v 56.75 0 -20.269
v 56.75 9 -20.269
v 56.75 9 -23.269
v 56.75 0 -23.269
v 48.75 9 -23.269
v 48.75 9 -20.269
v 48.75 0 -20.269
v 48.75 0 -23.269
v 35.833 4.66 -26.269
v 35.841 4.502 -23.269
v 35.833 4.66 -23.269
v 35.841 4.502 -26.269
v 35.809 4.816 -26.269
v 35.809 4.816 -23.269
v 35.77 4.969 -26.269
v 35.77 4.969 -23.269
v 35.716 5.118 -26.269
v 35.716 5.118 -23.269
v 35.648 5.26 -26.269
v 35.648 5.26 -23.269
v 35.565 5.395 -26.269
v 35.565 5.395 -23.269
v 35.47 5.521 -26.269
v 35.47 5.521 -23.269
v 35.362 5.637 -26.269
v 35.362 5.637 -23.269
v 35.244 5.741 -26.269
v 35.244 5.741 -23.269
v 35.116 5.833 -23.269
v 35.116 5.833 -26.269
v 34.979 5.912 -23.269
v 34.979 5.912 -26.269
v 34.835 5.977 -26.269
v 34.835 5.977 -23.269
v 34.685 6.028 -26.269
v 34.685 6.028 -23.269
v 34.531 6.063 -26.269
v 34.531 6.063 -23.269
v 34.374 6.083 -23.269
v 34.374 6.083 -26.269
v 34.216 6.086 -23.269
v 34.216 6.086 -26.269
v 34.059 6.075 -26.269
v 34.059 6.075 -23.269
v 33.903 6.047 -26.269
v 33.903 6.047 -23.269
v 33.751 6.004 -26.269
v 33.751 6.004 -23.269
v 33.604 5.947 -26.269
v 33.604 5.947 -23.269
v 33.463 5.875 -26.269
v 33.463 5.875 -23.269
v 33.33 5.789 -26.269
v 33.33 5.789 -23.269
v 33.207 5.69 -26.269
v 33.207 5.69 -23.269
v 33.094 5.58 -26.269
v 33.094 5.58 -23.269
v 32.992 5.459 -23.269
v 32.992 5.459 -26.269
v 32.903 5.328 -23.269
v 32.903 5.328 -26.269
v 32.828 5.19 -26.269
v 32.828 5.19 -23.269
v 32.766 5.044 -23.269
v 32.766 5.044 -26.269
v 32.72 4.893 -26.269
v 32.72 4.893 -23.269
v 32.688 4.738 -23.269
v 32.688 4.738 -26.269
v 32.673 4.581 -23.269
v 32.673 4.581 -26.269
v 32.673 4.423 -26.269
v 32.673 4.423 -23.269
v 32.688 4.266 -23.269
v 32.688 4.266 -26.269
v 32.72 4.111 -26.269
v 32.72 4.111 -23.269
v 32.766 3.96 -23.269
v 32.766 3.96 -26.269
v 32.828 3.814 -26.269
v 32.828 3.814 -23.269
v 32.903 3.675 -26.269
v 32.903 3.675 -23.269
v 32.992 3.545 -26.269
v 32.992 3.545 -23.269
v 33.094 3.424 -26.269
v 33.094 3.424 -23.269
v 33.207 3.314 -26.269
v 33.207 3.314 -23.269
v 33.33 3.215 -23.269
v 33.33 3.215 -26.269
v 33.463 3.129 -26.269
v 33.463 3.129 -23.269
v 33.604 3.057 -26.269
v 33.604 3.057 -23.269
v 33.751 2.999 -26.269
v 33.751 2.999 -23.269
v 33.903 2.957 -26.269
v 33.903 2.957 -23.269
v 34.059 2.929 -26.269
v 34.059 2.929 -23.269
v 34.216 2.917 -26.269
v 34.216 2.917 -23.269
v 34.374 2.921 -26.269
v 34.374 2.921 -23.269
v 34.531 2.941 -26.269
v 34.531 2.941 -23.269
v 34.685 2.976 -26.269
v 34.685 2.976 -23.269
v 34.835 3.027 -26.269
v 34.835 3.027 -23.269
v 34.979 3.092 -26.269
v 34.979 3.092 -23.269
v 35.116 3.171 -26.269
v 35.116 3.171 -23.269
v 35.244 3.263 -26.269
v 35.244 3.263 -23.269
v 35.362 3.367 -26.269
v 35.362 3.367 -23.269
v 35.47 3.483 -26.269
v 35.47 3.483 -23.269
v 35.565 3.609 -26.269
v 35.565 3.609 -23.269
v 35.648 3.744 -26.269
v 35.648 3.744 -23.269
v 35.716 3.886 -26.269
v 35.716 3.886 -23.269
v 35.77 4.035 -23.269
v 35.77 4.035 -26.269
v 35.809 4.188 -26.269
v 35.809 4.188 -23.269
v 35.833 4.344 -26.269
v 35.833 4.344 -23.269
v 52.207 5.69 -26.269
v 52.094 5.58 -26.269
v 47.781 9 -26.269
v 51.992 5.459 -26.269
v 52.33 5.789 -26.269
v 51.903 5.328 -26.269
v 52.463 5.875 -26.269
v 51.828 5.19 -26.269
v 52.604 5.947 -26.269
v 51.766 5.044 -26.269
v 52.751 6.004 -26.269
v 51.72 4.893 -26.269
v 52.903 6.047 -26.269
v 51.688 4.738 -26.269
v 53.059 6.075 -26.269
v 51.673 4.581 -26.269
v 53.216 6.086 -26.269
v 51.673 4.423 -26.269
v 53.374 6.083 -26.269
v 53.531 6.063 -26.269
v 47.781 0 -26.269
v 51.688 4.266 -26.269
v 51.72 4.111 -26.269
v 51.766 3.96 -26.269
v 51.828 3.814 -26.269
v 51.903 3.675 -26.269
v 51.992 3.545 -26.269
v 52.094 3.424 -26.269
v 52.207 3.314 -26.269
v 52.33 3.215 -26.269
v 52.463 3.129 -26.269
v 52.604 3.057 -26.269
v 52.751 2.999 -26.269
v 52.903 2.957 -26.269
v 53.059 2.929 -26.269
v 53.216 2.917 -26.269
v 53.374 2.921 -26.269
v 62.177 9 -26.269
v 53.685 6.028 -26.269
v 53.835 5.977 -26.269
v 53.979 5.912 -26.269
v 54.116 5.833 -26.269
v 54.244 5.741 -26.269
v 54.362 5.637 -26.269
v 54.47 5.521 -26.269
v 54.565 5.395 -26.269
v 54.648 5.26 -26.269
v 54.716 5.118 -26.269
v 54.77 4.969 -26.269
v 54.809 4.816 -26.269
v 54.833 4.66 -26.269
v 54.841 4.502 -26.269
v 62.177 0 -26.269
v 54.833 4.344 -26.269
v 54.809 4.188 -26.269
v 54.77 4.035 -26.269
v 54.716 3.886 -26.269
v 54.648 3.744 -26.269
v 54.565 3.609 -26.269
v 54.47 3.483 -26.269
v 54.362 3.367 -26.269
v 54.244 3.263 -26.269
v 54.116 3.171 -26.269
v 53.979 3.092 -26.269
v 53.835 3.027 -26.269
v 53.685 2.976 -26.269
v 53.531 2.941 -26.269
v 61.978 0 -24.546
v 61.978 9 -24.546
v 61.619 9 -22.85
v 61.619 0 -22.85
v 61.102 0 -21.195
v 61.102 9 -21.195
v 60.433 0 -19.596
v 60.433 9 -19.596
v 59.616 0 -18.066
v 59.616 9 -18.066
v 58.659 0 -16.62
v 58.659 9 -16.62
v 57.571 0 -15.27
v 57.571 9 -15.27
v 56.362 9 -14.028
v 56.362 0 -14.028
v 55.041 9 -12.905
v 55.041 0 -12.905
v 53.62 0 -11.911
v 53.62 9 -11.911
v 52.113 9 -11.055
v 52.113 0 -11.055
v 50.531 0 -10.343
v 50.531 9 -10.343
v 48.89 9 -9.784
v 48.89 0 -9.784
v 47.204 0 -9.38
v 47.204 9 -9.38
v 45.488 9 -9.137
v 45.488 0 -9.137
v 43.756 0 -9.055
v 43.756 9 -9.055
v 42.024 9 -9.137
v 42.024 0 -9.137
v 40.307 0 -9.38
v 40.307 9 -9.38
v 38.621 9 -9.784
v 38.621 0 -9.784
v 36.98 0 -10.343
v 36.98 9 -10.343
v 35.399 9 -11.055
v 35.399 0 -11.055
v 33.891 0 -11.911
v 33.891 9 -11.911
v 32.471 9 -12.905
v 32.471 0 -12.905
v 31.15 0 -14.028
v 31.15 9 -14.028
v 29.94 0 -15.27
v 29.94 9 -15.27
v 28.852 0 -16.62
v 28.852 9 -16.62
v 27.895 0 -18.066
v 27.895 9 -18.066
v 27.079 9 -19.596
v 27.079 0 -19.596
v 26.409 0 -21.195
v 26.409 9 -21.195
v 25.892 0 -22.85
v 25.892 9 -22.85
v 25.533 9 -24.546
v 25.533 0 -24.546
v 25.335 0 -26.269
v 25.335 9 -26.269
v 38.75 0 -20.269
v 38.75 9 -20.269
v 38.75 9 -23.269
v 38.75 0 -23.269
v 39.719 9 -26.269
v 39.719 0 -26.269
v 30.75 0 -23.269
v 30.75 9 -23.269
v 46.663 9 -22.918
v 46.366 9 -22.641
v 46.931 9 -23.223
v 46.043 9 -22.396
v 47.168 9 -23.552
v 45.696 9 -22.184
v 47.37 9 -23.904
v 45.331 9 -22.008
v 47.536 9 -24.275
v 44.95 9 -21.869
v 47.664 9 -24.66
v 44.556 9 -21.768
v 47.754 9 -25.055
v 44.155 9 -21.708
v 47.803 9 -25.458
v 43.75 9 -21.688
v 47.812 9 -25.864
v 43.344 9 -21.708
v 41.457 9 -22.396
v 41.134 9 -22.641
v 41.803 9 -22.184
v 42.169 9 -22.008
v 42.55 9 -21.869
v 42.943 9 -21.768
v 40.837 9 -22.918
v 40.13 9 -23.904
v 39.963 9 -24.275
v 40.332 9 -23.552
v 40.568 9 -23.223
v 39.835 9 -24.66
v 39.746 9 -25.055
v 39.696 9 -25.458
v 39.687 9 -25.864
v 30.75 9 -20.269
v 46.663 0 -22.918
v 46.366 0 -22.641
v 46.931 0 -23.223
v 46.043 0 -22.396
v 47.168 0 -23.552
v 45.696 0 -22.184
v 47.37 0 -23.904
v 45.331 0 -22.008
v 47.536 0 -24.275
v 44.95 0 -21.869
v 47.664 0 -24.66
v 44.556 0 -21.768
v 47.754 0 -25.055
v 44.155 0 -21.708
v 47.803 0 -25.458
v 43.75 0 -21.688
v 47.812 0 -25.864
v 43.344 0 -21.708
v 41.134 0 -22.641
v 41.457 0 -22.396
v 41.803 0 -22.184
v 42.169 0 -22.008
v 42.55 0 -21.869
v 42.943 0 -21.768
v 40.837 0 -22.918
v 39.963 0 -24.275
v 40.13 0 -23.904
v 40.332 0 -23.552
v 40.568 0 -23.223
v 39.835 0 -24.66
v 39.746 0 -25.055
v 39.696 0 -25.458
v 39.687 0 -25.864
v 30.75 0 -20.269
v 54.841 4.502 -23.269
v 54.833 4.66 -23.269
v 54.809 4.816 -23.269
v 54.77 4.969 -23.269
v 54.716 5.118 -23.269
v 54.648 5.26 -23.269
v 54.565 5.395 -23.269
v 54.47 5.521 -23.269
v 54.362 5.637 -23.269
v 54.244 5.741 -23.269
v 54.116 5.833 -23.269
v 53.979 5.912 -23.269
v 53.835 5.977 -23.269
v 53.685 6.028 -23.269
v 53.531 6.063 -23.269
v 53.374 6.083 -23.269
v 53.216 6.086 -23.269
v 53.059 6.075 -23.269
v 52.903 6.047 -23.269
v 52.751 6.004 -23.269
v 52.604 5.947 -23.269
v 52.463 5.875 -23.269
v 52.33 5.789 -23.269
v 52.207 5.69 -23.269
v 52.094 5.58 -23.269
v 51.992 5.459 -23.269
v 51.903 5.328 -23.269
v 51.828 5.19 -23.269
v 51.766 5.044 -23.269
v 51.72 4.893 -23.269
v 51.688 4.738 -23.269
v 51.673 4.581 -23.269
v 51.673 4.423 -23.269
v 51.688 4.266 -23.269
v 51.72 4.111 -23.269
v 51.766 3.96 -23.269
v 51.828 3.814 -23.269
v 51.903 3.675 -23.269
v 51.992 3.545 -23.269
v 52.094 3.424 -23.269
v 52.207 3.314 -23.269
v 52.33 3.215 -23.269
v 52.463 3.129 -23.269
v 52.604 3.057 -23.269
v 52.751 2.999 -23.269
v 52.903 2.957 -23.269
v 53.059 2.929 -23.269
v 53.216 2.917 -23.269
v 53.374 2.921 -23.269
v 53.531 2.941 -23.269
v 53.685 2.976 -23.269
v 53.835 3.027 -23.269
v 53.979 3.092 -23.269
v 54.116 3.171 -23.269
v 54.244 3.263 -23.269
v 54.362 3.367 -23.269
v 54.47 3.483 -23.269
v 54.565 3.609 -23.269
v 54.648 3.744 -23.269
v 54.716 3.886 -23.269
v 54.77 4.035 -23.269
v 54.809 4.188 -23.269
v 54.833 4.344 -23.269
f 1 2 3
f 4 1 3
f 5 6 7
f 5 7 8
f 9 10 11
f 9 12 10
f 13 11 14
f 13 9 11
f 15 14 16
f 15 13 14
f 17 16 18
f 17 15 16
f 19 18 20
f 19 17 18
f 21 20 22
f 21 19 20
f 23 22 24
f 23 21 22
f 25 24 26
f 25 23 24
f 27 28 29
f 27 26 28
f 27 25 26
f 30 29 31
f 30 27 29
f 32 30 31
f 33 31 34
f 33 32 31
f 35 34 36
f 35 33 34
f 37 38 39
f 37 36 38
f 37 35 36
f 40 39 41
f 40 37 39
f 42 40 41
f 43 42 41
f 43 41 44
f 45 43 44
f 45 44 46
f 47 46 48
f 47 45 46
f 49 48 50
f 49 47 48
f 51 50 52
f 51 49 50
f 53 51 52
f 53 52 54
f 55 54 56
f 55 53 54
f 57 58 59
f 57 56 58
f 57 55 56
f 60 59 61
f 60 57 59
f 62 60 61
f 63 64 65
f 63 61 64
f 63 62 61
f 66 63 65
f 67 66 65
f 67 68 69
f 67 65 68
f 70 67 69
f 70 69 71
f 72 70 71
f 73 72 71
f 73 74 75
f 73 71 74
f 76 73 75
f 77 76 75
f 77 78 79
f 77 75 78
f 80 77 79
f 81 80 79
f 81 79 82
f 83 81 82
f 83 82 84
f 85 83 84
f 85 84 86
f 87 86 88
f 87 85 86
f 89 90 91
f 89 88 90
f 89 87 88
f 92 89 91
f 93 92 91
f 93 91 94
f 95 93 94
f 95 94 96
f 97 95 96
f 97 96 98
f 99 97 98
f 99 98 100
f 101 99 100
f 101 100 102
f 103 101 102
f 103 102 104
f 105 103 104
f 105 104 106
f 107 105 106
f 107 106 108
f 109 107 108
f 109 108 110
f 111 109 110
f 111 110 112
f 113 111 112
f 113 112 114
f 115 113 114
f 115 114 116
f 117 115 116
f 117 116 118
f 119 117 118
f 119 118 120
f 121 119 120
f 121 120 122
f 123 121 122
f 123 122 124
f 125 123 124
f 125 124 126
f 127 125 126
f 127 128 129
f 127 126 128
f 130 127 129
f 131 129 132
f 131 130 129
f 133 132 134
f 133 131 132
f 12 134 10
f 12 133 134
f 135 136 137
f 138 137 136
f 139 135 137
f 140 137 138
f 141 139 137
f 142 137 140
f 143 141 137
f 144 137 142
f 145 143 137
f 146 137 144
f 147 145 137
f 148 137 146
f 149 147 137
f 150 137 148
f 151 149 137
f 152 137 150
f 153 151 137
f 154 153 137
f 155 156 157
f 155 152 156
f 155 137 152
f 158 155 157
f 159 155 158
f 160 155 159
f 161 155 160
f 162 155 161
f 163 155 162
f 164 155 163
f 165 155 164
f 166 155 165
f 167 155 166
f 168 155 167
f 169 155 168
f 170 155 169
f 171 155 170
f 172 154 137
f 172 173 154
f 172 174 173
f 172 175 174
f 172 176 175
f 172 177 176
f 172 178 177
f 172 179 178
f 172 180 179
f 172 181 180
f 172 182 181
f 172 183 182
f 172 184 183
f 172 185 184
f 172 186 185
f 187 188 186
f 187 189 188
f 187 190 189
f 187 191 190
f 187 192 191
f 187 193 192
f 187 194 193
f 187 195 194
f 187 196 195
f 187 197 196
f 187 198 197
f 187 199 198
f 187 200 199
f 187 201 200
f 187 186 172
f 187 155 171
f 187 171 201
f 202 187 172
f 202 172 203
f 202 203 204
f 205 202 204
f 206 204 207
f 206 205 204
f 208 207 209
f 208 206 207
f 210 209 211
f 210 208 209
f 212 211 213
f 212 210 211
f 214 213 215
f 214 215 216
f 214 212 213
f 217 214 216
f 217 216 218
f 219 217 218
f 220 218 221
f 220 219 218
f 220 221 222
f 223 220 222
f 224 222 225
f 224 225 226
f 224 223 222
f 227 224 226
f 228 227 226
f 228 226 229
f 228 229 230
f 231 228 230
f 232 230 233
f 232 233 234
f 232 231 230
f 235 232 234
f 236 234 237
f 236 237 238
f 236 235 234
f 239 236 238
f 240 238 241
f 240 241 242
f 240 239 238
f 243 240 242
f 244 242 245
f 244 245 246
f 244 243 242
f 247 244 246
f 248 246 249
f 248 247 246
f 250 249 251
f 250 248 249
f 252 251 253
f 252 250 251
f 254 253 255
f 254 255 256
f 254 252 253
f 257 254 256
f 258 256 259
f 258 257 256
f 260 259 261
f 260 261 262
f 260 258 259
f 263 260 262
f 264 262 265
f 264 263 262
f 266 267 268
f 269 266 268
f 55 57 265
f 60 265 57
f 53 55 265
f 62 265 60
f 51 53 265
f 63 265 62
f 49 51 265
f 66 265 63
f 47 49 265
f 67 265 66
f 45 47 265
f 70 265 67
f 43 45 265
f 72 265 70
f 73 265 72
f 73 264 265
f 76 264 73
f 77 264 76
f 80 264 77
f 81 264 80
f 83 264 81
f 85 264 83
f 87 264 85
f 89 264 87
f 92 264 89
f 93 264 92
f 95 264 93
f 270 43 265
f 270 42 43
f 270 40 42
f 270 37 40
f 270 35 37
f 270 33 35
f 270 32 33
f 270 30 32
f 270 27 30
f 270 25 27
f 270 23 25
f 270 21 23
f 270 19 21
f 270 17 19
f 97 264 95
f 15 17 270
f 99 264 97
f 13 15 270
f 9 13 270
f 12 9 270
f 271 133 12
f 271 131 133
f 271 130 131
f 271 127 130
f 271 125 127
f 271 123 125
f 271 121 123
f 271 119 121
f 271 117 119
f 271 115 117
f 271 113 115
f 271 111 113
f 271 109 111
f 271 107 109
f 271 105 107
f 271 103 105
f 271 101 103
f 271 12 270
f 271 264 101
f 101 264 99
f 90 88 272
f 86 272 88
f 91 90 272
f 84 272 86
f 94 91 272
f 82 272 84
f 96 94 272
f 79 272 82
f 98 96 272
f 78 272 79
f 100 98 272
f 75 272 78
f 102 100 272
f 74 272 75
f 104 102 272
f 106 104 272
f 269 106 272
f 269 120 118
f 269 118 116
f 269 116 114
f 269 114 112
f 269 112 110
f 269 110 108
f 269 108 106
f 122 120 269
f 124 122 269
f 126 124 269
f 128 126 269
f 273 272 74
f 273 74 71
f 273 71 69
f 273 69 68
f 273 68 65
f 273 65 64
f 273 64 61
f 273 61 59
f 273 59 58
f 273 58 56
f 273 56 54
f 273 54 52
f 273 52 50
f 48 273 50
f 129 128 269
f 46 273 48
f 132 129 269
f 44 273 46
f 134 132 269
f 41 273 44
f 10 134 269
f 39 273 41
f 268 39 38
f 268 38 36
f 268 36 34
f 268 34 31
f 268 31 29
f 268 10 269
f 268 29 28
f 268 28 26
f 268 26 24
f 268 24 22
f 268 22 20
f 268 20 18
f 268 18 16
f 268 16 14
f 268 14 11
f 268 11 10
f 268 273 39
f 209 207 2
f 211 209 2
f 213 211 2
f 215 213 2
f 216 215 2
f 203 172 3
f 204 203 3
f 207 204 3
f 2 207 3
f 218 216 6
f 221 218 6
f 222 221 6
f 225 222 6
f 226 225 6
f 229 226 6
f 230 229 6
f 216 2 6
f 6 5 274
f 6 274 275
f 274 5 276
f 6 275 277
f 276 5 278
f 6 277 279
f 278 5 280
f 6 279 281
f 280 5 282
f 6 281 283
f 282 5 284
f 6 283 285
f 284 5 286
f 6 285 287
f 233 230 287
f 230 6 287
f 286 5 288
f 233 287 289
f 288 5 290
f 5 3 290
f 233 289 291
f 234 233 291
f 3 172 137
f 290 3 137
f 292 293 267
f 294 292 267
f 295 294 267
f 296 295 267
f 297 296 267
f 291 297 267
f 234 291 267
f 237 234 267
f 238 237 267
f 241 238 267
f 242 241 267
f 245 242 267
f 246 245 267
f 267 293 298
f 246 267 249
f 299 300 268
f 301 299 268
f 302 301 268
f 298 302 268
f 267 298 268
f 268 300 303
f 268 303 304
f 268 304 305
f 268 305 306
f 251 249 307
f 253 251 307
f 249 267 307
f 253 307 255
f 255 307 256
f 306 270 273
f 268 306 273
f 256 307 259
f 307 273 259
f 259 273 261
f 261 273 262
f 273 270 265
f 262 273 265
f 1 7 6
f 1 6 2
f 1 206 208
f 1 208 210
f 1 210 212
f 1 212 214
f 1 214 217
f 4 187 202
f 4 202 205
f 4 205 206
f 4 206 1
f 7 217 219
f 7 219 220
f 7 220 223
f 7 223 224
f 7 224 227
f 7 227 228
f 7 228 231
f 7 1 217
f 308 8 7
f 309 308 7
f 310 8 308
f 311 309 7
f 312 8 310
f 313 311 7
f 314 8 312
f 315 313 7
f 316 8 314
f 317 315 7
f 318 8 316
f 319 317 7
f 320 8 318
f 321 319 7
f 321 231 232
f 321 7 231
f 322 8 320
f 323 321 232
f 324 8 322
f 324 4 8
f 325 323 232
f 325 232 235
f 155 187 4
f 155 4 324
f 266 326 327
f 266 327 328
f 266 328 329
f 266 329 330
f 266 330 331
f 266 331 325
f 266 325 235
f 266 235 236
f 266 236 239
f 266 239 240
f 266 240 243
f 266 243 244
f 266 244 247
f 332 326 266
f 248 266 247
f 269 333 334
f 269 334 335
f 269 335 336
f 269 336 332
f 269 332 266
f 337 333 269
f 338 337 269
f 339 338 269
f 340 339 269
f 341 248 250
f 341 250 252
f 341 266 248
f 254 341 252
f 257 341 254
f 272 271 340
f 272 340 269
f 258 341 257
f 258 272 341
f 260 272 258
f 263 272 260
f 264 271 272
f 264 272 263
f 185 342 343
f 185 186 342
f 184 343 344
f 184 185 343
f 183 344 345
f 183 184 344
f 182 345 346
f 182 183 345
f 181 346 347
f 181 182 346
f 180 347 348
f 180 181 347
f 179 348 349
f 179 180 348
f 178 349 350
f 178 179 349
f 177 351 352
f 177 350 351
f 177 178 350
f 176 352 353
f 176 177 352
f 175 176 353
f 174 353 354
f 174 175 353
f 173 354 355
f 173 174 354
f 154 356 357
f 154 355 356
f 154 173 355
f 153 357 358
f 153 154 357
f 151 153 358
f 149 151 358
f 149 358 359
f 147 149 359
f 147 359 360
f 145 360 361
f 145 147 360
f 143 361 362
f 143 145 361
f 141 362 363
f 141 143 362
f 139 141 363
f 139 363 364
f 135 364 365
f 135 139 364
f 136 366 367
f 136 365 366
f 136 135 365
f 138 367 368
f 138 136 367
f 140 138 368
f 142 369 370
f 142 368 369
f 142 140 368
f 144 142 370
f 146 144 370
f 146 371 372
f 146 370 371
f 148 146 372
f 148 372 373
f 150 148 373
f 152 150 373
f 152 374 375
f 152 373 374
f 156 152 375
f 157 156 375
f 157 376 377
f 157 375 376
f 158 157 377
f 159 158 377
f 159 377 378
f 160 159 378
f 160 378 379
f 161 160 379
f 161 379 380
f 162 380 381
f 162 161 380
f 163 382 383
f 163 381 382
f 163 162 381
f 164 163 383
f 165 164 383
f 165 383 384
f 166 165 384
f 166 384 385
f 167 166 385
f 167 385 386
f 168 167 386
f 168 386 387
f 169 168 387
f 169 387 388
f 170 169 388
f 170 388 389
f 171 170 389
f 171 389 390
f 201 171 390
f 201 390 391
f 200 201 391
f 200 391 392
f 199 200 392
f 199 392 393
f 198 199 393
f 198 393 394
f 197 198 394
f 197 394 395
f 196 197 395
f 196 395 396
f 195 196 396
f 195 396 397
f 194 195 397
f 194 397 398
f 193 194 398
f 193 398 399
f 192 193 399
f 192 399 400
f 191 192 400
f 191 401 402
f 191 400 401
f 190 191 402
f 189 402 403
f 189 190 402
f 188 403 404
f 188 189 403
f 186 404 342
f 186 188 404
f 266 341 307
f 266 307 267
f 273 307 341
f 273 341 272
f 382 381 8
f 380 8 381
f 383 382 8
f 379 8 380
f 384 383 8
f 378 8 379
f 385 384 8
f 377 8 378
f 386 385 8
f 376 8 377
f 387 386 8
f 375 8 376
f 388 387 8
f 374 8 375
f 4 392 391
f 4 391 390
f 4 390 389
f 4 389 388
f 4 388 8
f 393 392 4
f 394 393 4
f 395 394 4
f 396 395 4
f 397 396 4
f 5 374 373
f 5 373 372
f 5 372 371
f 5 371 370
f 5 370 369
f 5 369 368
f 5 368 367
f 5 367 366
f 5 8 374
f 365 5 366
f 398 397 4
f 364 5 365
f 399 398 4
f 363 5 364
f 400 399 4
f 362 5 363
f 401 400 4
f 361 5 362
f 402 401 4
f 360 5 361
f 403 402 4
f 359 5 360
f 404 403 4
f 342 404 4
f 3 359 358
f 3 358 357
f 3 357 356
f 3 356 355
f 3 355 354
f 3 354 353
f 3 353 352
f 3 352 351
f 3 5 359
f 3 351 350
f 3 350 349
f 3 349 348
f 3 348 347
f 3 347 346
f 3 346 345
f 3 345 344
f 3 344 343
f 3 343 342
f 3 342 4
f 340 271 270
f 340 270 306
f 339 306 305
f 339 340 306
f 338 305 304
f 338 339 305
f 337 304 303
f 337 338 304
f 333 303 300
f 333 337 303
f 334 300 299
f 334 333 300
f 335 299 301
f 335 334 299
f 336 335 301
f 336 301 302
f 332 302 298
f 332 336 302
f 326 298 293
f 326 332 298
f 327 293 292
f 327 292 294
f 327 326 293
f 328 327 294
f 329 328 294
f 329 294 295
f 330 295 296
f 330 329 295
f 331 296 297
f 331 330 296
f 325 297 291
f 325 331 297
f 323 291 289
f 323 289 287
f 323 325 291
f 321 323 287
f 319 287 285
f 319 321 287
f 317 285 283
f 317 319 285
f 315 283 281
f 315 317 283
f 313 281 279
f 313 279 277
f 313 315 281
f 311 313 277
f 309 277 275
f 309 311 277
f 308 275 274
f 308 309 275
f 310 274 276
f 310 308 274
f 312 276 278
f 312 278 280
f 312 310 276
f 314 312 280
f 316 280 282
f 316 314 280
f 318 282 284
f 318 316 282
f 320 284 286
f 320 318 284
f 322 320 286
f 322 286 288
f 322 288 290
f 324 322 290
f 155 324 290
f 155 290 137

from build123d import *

# Parameters (mm, degrees)
BOSS_EXTRUDE1_DEPTH = 9
SKETCH2_R           = 1.585
CUT_EXTRUDE1_DEPTH  = 32
SKETCH3_W           = 8
SKETCH3_H           = 3
CUT_EXTRUDE4_DEPTH  = 32


with BuildPart() as part:
    # Sketch1 → Boss-Extrude1 (new body)
    with BuildSketch(Plane(origin=(0, 0, 0), x_dir=(1, 0, 0), z_dir=(0, 1, 0))):
        with BuildLine():
            Line((25.334549447, 26.26861883), (39.718507893, 26.26861883))
            ThreePointArc((39.718507893, 26.26861883), (43.74975272, 21.687555144), (47.780997547, 26.26861883))
            Line((47.780997547, 26.26861883), (62.176678451, 26.26861883))
            ThreePointArc((62.176678451, 26.26861883), (43.755613949, 9.05519235), (25.334549447, 26.26861883))
        make_face()
    extrude(amount=BOSS_EXTRUDE1_DEPTH)

    # Sketch2 → Cut-Extrude1 (cut)
    with BuildSketch(Plane(origin=(43.755613949, 0.001959277, -52.26861883), x_dir=(1, 0, 0), z_dir=(0, 0, 1))):
        with Locations((9.500000009, 4.5)):
            Circle(SKETCH2_R)
        with Locations((-9.499999996, 4.5)):
            Circle(SKETCH2_R)
    extrude(amount=CUT_EXTRUDE1_DEPTH, mode=Mode.SUBTRACT)

    # Sketch3 → Cut-Extrude4 (cut)
    with BuildSketch(Plane(origin=(0, 9, 0), x_dir=(1, 0, 0), z_dir=(0, 1, 0))):
        with Locations((52.74975272, 21.76861883)):
            Rectangle(SKETCH3_W, SKETCH3_H)
        with Locations((34.74975272, 21.76861883)):
            Rectangle(SKETCH3_W, SKETCH3_H)
    extrude(amount=-CUT_EXTRUDE4_DEPTH, mode=Mode.SUBTRACT)


solid = part.part
